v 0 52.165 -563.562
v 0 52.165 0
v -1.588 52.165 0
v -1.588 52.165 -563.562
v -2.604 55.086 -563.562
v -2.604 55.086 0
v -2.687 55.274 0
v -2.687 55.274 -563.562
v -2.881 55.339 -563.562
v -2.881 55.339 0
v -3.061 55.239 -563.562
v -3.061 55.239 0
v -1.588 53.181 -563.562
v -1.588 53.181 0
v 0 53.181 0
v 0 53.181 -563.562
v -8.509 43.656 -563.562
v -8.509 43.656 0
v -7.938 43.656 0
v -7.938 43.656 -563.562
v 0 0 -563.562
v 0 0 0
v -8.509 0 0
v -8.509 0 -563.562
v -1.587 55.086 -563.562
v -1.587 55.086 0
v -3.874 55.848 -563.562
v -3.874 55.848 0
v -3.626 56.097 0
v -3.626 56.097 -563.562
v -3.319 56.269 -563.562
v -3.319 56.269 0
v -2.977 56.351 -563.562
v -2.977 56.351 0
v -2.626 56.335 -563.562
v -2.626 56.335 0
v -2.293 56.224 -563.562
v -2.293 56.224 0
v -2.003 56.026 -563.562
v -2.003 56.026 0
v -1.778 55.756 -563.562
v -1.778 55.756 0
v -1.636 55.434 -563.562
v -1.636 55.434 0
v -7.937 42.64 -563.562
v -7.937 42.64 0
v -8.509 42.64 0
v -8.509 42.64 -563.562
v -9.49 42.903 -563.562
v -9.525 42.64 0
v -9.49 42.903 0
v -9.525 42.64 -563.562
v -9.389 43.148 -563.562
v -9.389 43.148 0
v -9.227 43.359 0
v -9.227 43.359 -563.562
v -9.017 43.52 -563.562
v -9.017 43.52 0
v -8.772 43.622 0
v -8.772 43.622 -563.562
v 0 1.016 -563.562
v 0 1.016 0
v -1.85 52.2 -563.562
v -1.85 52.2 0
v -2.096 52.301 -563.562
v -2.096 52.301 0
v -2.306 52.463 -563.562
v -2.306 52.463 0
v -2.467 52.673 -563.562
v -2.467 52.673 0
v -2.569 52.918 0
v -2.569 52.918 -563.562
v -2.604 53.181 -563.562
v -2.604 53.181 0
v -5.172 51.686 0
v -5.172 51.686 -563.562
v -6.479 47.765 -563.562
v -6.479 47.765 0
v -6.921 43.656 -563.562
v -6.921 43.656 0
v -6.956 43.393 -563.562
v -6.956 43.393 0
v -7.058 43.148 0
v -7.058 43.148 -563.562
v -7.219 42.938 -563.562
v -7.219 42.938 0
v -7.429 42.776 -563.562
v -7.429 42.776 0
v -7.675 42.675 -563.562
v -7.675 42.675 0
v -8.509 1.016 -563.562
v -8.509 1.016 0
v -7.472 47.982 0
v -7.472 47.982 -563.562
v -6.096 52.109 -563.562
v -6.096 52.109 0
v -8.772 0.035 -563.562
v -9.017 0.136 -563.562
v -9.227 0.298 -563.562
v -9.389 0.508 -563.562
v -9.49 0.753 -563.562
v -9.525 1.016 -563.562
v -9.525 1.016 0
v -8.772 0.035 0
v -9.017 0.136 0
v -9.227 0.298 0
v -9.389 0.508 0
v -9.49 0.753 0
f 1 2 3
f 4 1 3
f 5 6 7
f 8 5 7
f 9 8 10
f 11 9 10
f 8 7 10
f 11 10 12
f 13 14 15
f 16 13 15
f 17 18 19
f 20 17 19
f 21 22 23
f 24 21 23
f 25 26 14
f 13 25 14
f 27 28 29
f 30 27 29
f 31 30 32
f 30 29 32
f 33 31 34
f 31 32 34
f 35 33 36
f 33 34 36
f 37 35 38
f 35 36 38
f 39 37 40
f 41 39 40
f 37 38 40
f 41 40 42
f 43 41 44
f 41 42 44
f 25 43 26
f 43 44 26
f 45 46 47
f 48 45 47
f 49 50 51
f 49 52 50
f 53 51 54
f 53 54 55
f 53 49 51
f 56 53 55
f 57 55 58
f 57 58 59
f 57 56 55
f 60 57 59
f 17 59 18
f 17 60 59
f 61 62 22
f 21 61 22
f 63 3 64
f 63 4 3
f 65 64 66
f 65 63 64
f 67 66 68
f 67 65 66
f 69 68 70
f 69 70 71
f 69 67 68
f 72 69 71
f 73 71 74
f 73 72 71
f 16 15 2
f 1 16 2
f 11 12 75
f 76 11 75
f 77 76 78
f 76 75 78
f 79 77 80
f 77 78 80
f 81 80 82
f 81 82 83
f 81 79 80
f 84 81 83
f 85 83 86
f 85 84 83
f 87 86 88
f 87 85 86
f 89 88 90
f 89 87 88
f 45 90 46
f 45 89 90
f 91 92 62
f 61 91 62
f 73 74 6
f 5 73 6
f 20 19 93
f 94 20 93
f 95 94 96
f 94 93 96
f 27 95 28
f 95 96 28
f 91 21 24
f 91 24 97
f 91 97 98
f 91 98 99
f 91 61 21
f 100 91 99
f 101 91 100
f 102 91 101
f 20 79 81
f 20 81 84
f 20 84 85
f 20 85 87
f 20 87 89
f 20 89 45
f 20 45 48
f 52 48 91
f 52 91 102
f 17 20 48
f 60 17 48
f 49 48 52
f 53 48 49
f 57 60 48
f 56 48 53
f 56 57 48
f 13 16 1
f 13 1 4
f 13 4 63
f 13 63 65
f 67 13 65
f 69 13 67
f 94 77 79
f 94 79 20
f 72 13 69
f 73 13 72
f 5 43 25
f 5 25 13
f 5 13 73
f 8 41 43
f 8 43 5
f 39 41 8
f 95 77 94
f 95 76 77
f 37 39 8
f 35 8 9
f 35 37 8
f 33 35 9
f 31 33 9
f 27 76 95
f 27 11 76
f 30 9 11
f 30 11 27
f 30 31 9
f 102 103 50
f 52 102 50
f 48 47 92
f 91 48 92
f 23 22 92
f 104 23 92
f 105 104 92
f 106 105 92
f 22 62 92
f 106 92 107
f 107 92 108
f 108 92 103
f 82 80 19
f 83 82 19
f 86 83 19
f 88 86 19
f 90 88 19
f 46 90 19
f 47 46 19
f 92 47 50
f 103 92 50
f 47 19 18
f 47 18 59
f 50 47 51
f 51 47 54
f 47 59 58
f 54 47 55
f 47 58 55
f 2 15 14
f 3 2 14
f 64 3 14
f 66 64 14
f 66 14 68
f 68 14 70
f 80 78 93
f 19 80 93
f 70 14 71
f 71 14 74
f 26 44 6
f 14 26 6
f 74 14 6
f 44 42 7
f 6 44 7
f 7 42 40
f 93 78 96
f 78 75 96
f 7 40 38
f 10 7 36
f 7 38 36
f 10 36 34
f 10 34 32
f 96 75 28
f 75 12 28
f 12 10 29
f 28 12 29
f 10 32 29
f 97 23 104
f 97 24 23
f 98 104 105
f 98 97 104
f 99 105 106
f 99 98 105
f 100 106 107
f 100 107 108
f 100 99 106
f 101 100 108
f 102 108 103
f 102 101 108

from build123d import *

# Parameters (mm, degrees)
EXTRUDE_THIN1_DEPTH = 563.5625
FILLET1_R           = 1.016


with BuildPart() as part:
    # Sketch1 → Extrude-Thin1 (new body)
    with BuildSketch(Plane.XY):
        with BuildLine():
            Line((0, 0), (-9.525, 0))
            Line((-9.525, 0), (-9.525, 43.65625))
            Line((-9.525, 43.65625), (-7.9375, 43.65625))
            ThreePointArc((-7.9375, 43.65625), (-6.894744616, 50.081998205), (-3.8735, 55.84825))
            ThreePointArc((-3.8735, 55.84825), (-2.455890737, 56.291077789), (-1.5875, 55.08625))
            Line((-1.5875, 55.08625), (-1.5875, 53.18125))
            Line((-1.5875, 53.18125), (0, 53.18125))
            Line((0, 53.18125), (0, 52.16525))
            Line((0, 52.16525), (-2.6035, 52.16525))
            Line((-2.6035, 52.16525), (-2.6035, 55.08625))
            ThreePointArc((-2.6035, 55.08625), (-2.777178147, 55.327215558), (-3.0607, 55.23865))
            ThreePointArc((-3.0607, 55.23865), (-6.085235087, 49.276497038), (-6.894744616, 42.64025))
            Line((-6.894744616, 42.64025), (-8.509, 42.64025))
            Line((-8.509, 42.64025), (-8.509, 1.016))
            Line((-8.509, 1.016), (0, 1.016))
            Line((0, 1.016), (0, 0))
        make_face()
    extrude(amount=-EXTRUDE_THIN1_DEPTH)

    # Fillet1
    fillet1_edges = [part.edges().sort_by_distance(p)[0] for p in [
        (-2.6035, 52.16525, -281.78125),
        (-6.894744616, 42.64025, -281.78125),
        (-9.525, 0, -281.78125),
        (-9.525, 43.65625, -281.78125),
    ]]
    fillet(fillet1_edges, radius=FILLET1_R)


solid = part.part
